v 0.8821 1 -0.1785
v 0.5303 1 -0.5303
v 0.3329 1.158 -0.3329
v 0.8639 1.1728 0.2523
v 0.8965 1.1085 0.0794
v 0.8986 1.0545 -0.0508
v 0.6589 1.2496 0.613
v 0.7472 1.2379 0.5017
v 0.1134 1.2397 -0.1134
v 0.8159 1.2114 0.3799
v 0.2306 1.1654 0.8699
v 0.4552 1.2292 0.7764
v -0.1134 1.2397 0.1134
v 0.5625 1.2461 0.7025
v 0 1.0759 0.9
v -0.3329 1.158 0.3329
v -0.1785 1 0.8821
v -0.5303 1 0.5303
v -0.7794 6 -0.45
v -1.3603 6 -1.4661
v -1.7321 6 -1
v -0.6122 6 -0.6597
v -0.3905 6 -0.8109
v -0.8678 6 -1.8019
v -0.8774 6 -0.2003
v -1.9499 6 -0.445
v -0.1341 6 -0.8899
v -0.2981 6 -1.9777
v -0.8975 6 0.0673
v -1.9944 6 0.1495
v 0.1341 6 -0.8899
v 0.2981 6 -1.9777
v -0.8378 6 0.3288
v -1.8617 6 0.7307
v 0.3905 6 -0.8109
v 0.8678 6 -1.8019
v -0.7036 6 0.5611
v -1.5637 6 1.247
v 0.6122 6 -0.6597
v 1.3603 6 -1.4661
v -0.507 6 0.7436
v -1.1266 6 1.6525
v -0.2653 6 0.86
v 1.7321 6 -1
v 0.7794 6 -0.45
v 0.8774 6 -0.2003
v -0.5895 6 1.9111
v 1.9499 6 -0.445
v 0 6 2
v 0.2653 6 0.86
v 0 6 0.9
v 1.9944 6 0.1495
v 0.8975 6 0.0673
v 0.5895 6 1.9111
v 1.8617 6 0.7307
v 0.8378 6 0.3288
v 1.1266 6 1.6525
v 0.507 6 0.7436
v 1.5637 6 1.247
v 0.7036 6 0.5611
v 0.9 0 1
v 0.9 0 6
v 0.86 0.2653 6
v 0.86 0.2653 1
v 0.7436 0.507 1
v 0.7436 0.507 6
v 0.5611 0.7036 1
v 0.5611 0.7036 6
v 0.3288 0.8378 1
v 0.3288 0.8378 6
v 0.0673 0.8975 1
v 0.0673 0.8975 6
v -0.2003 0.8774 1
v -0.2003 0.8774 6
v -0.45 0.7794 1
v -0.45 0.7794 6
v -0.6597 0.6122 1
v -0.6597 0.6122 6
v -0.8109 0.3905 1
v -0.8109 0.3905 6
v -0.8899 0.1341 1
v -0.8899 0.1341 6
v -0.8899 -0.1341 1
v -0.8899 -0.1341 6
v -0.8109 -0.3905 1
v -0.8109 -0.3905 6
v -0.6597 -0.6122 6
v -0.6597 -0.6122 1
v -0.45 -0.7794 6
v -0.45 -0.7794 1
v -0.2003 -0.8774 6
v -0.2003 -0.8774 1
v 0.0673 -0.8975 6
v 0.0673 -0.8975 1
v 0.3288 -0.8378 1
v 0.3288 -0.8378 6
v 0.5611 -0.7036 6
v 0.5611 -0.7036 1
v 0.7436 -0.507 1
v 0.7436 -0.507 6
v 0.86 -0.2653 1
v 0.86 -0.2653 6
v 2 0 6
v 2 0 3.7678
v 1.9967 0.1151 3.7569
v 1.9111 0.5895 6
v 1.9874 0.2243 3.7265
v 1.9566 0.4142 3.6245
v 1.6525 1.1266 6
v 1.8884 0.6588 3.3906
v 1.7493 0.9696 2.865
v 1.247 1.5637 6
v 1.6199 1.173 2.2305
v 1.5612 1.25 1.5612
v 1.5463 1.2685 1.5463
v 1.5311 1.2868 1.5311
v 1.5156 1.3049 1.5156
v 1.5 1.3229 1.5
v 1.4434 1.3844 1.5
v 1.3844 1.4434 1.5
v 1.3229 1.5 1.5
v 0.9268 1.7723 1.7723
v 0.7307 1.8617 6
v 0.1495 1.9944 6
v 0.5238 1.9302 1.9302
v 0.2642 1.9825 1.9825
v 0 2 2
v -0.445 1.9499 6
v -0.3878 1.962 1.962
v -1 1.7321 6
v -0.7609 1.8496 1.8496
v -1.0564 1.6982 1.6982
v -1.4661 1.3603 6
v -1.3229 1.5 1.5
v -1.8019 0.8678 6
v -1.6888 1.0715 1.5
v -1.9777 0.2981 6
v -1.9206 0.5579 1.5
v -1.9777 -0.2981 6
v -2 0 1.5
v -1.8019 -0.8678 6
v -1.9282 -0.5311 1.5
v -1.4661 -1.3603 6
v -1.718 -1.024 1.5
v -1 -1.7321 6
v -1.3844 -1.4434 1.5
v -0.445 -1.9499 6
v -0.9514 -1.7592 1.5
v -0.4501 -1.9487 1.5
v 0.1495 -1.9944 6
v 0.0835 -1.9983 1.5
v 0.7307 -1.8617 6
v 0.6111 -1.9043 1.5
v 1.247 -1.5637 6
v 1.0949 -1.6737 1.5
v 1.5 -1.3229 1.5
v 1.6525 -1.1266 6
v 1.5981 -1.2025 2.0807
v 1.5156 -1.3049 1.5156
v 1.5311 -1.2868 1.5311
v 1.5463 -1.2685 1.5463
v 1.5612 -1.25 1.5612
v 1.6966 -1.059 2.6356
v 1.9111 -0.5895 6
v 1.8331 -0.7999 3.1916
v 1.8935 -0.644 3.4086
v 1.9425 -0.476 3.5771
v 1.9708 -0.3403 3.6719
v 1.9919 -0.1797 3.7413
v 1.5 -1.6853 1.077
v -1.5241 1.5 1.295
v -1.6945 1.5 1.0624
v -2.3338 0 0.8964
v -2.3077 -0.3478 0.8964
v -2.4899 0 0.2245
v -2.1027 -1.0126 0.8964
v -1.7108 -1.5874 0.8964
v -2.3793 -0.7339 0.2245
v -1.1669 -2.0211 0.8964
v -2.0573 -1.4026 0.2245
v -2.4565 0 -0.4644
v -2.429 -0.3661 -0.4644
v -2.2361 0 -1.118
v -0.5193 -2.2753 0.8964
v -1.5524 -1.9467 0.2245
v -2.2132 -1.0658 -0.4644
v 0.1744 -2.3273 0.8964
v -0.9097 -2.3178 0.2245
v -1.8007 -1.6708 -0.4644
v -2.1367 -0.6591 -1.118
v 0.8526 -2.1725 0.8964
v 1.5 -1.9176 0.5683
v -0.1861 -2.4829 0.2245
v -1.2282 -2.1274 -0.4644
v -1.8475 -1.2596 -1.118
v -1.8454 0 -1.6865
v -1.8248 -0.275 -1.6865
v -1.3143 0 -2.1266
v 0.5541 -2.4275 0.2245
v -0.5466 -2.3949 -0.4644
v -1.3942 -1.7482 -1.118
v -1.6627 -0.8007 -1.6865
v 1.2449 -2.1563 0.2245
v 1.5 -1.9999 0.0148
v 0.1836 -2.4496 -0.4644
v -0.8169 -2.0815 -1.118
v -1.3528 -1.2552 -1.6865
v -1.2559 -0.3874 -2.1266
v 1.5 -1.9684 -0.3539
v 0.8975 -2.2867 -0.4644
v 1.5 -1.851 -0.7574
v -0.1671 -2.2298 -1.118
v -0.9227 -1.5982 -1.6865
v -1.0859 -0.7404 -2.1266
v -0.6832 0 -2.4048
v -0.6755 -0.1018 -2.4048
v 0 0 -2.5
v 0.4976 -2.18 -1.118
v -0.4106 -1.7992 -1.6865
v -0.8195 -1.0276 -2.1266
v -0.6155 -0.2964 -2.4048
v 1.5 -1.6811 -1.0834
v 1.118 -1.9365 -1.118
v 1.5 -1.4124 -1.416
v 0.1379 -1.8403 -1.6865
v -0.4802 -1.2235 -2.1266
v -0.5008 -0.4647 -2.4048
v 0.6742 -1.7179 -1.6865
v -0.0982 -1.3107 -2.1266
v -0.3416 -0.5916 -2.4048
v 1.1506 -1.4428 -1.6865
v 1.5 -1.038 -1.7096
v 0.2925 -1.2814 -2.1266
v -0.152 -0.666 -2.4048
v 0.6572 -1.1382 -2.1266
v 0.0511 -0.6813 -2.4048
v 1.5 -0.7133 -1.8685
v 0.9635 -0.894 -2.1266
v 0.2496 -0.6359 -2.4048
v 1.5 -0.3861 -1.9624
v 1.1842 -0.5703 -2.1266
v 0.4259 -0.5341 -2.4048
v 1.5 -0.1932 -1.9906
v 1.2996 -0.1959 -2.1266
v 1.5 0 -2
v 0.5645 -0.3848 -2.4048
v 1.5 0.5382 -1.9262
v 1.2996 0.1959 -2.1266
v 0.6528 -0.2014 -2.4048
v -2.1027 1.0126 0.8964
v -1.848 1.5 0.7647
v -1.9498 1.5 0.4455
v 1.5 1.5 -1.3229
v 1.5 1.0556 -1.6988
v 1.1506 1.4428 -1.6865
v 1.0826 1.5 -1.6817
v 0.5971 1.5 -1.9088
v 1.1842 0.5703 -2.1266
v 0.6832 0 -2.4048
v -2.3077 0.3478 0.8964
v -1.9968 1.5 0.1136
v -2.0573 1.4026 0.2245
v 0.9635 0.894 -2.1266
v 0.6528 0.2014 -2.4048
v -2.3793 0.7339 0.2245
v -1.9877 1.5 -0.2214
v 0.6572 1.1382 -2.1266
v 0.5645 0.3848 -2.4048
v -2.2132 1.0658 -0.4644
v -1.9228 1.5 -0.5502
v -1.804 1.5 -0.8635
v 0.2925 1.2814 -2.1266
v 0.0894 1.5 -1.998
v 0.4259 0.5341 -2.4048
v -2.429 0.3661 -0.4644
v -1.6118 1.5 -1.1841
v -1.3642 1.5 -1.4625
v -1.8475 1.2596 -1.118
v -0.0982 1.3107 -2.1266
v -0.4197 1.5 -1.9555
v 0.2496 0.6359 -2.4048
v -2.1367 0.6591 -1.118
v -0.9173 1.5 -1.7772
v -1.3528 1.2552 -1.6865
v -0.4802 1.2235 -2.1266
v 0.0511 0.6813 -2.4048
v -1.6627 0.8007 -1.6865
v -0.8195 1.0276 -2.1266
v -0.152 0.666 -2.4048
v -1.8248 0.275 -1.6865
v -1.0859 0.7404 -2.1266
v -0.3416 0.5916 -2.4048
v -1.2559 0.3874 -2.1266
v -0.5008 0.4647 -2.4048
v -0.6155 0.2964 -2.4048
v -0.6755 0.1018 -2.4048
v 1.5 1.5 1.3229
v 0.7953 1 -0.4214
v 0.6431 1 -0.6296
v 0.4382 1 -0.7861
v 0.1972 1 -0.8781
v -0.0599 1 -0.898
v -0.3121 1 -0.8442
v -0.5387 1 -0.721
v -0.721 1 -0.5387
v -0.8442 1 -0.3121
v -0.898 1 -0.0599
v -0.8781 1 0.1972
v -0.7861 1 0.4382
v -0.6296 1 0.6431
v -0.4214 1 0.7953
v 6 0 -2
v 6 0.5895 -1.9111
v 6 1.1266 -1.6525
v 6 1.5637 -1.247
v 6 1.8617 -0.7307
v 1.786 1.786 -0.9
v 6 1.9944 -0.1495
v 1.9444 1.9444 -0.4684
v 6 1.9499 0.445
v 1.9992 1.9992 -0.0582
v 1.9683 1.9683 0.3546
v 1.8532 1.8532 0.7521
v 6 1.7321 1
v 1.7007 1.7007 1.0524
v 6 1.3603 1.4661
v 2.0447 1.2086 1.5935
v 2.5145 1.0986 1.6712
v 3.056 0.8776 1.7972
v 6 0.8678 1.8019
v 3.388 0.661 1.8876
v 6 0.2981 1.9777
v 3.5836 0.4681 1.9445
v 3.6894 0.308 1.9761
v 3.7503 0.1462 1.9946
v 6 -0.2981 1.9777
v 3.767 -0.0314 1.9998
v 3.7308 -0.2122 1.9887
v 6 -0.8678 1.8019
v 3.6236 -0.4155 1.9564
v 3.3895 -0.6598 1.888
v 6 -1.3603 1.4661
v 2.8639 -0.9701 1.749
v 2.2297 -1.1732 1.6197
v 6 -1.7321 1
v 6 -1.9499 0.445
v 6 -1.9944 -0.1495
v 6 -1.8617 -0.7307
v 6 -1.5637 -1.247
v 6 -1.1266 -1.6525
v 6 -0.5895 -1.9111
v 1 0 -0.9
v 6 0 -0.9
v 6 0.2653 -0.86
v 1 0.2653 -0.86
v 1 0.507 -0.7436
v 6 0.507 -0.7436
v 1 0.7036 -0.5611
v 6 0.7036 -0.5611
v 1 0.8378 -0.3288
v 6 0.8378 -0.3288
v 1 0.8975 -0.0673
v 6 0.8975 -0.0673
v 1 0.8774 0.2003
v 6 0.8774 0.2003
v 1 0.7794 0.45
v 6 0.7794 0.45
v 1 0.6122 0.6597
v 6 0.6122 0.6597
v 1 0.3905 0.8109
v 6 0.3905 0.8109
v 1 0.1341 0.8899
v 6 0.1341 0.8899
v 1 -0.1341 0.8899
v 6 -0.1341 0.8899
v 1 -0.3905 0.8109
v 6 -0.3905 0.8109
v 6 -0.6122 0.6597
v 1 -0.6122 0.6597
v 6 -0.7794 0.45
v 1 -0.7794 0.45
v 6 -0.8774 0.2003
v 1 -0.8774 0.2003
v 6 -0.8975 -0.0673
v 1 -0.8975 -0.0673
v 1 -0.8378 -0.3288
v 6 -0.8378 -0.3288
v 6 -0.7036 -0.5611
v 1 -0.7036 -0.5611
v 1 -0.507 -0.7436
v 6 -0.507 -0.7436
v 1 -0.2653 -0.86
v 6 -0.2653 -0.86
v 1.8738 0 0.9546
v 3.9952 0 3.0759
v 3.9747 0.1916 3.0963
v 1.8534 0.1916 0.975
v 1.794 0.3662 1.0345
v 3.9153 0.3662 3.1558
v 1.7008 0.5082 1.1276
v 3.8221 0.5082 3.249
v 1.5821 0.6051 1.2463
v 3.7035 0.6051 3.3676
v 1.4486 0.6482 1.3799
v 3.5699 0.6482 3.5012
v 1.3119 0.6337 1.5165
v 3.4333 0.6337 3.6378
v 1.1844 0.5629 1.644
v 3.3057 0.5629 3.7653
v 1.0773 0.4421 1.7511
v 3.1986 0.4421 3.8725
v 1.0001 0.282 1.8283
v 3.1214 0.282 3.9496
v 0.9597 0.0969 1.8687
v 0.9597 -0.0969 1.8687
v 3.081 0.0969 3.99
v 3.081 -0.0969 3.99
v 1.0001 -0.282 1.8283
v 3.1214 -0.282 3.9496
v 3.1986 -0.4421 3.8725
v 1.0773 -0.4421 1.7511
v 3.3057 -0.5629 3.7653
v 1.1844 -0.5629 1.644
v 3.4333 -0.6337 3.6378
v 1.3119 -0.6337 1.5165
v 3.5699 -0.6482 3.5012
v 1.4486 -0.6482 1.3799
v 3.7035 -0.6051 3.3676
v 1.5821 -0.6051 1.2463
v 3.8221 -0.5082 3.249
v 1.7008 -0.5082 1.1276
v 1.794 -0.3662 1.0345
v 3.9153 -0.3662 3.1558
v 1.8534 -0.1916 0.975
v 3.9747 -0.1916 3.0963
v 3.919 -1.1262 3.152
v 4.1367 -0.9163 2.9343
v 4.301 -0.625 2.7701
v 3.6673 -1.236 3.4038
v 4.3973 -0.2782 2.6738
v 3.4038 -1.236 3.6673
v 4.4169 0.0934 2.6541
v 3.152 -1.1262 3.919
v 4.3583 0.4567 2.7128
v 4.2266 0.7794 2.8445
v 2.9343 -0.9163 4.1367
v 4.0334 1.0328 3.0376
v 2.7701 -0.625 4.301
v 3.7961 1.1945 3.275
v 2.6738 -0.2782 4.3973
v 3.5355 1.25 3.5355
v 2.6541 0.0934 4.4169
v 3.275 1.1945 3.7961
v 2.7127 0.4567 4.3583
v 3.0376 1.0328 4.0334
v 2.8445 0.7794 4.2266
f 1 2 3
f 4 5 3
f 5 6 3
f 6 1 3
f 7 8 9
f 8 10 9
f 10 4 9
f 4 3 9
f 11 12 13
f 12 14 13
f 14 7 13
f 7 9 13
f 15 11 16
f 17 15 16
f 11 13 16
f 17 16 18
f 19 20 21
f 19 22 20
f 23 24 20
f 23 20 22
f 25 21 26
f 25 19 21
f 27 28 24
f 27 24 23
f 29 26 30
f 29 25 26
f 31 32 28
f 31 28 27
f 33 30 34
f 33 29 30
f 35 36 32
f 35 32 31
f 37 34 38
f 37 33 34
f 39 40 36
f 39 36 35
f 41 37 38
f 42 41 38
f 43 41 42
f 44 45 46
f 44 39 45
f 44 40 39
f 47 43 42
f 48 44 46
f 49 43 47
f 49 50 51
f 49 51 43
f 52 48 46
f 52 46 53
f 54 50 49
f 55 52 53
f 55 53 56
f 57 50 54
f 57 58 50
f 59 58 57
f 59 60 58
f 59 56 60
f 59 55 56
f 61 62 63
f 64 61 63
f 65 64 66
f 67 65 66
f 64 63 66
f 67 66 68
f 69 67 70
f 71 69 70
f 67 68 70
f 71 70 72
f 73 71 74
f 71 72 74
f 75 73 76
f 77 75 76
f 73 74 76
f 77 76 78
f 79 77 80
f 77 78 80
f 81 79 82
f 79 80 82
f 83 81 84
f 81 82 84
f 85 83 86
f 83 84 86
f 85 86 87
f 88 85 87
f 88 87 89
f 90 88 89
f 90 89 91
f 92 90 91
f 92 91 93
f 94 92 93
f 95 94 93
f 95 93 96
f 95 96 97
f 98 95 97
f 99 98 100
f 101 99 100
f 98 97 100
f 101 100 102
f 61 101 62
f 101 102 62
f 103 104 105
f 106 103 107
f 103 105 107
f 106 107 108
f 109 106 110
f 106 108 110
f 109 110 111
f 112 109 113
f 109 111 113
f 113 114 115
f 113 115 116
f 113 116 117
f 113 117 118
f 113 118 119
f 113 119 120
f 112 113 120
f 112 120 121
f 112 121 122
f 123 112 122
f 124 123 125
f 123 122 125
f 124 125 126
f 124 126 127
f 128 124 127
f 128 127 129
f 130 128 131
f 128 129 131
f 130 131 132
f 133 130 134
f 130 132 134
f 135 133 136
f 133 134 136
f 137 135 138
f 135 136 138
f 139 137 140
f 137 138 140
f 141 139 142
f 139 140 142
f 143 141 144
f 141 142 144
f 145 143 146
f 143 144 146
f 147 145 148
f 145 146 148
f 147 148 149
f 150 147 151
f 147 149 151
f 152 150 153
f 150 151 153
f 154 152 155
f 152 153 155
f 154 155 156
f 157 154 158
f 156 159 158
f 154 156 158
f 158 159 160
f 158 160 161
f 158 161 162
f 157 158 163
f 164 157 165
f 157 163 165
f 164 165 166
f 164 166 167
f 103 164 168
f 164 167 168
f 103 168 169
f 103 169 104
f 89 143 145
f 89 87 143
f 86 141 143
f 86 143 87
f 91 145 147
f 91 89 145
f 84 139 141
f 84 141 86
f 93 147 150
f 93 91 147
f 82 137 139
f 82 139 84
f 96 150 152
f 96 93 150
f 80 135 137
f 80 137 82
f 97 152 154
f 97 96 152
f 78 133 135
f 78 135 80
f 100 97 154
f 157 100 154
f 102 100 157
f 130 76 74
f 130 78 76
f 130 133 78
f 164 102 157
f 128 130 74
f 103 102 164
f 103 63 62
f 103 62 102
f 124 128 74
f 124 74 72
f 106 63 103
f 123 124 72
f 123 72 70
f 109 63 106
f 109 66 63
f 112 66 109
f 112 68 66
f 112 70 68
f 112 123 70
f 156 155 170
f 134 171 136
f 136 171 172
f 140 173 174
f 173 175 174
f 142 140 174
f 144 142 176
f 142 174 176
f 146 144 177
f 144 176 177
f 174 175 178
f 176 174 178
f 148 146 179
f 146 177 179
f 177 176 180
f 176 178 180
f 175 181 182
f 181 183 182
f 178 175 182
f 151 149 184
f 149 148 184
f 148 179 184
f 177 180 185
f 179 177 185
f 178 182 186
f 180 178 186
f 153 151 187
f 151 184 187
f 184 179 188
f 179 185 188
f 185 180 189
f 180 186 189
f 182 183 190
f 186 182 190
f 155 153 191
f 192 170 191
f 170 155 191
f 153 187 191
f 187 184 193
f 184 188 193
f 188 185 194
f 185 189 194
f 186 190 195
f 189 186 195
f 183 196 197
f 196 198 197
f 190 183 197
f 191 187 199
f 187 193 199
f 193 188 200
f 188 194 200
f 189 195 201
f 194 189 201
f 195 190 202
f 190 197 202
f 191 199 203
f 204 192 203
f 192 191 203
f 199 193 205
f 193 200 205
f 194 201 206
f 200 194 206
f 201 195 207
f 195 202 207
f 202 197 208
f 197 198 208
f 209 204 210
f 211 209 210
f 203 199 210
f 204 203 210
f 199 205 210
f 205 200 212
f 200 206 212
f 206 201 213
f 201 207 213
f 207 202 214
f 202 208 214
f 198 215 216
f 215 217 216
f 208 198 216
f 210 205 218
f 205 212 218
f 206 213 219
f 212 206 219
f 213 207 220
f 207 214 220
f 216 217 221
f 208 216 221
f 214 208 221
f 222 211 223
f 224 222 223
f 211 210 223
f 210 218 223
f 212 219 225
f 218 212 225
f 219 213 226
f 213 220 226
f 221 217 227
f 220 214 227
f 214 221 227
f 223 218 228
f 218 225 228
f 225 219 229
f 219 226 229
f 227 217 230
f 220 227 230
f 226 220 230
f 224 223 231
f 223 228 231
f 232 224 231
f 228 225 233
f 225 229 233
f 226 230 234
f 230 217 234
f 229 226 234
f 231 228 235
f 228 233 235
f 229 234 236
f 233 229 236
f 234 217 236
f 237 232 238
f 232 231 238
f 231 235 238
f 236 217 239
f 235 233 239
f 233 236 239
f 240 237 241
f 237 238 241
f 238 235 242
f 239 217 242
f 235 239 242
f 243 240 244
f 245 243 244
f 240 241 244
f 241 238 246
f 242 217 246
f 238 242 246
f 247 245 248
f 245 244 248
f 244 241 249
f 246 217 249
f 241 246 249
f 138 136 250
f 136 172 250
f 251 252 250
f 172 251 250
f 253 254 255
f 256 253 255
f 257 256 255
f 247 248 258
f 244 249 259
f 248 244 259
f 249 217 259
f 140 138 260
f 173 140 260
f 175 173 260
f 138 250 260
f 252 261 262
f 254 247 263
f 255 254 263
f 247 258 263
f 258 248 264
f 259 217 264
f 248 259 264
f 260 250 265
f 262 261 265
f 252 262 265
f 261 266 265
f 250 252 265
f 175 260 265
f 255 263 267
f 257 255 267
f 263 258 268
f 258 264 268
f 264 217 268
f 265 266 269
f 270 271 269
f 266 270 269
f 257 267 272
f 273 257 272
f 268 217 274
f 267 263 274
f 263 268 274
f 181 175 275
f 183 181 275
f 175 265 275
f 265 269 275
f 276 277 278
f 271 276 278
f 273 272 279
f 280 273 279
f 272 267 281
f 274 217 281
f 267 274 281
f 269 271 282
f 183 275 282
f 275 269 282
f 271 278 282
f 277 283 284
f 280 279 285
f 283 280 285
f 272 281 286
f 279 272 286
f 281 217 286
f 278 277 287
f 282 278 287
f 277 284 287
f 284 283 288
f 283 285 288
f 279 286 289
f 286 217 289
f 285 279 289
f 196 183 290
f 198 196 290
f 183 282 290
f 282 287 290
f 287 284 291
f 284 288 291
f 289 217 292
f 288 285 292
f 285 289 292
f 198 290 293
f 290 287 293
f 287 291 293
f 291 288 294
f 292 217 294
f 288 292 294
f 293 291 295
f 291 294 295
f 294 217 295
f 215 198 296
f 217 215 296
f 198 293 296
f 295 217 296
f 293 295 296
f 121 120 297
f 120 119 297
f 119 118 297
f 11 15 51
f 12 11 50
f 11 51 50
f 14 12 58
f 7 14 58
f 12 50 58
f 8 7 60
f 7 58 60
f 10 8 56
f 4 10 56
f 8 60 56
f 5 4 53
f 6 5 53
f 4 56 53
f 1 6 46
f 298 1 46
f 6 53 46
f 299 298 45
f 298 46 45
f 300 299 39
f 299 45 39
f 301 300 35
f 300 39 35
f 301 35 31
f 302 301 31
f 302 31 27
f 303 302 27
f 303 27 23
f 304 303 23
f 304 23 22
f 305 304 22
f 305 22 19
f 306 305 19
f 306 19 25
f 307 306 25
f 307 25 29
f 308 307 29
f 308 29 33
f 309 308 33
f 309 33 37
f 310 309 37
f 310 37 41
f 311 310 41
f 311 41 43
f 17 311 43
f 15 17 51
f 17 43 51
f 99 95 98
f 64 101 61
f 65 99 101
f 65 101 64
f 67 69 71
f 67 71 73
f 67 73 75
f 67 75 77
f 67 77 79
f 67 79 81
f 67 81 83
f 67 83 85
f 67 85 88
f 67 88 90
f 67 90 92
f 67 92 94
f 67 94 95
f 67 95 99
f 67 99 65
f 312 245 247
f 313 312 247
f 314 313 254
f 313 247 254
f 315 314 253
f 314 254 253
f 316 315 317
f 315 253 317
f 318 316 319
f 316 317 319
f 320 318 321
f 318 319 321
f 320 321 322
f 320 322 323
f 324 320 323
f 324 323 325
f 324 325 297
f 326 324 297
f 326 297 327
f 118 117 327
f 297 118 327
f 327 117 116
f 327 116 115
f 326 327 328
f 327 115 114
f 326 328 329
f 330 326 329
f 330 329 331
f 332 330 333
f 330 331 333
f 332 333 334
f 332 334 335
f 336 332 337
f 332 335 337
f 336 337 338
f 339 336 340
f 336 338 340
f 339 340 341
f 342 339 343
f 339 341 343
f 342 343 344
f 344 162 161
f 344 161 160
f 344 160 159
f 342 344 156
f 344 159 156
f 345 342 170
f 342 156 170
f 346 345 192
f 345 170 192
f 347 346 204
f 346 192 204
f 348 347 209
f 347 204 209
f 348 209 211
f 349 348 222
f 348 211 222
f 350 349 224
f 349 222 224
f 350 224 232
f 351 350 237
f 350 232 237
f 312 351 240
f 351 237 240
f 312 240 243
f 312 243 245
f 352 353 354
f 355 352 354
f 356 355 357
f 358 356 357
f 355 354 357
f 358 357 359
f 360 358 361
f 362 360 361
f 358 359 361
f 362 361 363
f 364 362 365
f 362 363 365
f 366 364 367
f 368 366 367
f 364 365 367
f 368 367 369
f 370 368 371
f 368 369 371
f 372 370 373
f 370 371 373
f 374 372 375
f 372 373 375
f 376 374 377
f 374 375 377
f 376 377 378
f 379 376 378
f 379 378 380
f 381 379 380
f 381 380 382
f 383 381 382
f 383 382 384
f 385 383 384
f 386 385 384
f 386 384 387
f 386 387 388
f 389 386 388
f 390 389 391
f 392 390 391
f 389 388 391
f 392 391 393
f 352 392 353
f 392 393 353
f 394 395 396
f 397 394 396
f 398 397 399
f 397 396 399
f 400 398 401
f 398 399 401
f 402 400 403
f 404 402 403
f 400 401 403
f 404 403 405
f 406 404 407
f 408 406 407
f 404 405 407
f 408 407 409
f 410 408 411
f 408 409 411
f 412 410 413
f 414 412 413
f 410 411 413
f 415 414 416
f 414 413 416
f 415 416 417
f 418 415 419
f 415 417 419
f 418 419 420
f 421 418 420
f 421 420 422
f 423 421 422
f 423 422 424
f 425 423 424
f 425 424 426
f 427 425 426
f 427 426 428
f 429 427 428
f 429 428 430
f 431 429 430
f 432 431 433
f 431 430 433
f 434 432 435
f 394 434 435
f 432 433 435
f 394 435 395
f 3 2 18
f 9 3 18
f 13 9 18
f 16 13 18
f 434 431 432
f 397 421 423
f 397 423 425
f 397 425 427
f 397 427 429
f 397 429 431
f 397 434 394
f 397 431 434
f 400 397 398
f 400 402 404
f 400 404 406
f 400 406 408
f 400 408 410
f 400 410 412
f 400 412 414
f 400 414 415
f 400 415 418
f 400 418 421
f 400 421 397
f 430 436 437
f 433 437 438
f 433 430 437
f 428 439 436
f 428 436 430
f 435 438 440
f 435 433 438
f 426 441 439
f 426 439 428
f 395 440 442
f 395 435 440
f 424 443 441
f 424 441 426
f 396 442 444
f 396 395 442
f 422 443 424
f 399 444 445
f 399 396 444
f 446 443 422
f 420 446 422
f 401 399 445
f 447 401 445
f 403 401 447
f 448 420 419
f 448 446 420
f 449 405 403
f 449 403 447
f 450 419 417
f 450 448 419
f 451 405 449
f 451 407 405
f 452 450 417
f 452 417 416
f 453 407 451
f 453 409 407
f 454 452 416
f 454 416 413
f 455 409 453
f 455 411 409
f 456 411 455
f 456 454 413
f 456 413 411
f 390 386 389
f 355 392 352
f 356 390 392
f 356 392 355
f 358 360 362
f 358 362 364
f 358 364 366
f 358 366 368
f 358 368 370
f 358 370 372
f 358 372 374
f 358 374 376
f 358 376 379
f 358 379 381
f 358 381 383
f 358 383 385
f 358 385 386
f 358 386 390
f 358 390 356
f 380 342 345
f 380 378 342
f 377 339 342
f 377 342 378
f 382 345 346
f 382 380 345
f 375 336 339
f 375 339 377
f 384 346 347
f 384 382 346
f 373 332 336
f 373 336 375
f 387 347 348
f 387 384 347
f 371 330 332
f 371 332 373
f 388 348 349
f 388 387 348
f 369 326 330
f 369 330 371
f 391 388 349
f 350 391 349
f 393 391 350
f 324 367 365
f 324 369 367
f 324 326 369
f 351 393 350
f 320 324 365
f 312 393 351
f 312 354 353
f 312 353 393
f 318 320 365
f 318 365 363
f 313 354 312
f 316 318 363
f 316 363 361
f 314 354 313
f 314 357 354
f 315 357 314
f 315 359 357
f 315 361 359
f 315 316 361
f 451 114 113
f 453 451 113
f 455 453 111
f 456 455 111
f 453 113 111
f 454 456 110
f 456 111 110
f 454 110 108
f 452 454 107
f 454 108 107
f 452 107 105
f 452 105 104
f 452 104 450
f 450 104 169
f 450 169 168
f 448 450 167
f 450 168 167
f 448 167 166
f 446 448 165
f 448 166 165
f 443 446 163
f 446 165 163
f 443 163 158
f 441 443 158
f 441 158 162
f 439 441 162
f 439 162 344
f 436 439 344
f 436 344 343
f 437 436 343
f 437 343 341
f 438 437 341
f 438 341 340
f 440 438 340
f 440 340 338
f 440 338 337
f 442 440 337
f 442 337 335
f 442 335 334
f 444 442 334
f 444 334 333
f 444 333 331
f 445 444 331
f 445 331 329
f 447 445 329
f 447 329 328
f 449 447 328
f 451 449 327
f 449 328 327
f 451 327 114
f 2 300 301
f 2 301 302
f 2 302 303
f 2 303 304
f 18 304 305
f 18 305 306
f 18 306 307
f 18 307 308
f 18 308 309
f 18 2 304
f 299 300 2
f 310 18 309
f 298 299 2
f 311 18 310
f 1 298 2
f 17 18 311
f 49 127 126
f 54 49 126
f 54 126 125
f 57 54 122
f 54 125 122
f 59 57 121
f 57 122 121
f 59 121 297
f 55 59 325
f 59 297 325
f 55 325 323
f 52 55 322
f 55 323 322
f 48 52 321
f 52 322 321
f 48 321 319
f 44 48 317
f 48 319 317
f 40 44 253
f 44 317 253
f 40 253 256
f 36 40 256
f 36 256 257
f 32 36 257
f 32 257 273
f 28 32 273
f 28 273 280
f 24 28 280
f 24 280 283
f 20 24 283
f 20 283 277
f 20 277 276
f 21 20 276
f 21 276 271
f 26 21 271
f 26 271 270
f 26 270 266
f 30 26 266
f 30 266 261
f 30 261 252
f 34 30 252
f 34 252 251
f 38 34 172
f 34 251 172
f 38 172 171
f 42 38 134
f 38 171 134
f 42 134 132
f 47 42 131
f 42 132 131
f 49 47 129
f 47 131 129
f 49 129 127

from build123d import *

# Parameters (mm, degrees)
SKETCH_2_R          = 2
EXTRUDE_1_DEPTH     = 6
SKETCH_3_R          = 2
EXTRUDE_2_DEPTH     = 6
SKETCH_4_R          = 2
EXTRUDE_3_DEPTH     = 6
SKETCH_6_R          = 0.9
CUT_EXTRUDE_1_DEPTH = 5
SKETCH_10_R         = 1.25
EXTRUDE_4_DEPTH     = 5
SKETCH_7_R          = 0.9
CUT_EXTRUDE_2_DEPTH = 5
SKETCH_8_R          = 0.9
CUT_EXTRUDE_3_DEPTH = 5
SKETCH_14_R         = 0.65
CUT_EXTRUDE_4_DEPTH = 3


with BuildPart() as part:
    # 草图2 → 凸台-拉伸1 (new body)
    with BuildSketch(Plane(origin=(0, 0, 0), x_dir=(1, 0, 0), z_dir=(0, 1, 0))):
        with Locations(Location((0, 0, 0), (0, 0, 270))):
            Circle(SKETCH_2_R)
    extrude(amount=EXTRUDE_1_DEPTH)

    # 草图3 → 凸台-拉伸2 (add)
    with BuildSketch(Plane.XY):
        Circle(SKETCH_3_R)
    extrude(amount=EXTRUDE_2_DEPTH)

    # 草图4 → 凸台-拉伸3 (add)
    with BuildSketch(Plane(origin=(0, 0, 0), x_dir=(0, 0, -1), z_dir=(1, 0, 0))):
        Circle(SKETCH_4_R)
    extrude(amount=EXTRUDE_3_DEPTH)

    # 草图5 → 旋转3 (revolve)
    with BuildSketch(Plane(origin=(0, 0, 0), x_dir=(1, 0, 0), z_dir=(0, 1, 0))):
        with BuildLine():
            Line((0, 2.5), (0, -2.5))
            ThreePointArc((0, -2.5), (-2.5, 0), (0, 2.5))
        make_face()
    revolve(axis=Axis((0, 0, -2.5), (0, 0, 1)))

    # 草图6 → 切除-拉伸1 (cut)
    with BuildSketch(Plane(origin=(0, 6, 0), x_dir=(1, 0, 0), z_dir=(0, 1, 0))):
        with Locations(Location((0, 0, 0), (0, 0, 270))):
            Circle(SKETCH_6_R)
    extrude(amount=-CUT_EXTRUDE_1_DEPTH, mode=Mode.SUBTRACT)

    # 草图10 → 凸台-拉伸4 (add)
    with BuildSketch(Plane(origin=(0, 0, 0), x_dir=(0.7071067811865461, 0, -0.707106781186549), z_dir=(0.707106781186549, 0, 0.7071067811865461))):
        with Locations(Location((0, 0, 0), (0, 0, 90.000016419))):
            Circle(SKETCH_10_R)
    extrude(amount=EXTRUDE_4_DEPTH)

    # 草图7 → 切除-拉伸2 (cut)
    with BuildSketch(Plane(origin=(6, 0, 0), x_dir=(0, 0, -1), z_dir=(1, 0, 0))):
        Circle(SKETCH_7_R)
    extrude(amount=-CUT_EXTRUDE_2_DEPTH, mode=Mode.SUBTRACT)

    # 草图8 → 切除-拉伸3 (cut)
    with BuildSketch(Plane.XY.offset(6)):
        Circle(SKETCH_8_R)
    extrude(amount=-CUT_EXTRUDE_3_DEPTH, mode=Mode.SUBTRACT)

    # 草图14 → 切除-拉伸4 (cut)
    with BuildSketch(Plane(origin=(3.535533906, 0, 3.535533906), x_dir=(0.7071067811865462, 0, -0.7071067811865489), z_dir=(0.7071067811865489, 0, 0.7071067811865462))):
        Circle(SKETCH_14_R)
    extrude(amount=-CUT_EXTRUDE_4_DEPTH, mode=Mode.SUBTRACT)


solid = part.part
